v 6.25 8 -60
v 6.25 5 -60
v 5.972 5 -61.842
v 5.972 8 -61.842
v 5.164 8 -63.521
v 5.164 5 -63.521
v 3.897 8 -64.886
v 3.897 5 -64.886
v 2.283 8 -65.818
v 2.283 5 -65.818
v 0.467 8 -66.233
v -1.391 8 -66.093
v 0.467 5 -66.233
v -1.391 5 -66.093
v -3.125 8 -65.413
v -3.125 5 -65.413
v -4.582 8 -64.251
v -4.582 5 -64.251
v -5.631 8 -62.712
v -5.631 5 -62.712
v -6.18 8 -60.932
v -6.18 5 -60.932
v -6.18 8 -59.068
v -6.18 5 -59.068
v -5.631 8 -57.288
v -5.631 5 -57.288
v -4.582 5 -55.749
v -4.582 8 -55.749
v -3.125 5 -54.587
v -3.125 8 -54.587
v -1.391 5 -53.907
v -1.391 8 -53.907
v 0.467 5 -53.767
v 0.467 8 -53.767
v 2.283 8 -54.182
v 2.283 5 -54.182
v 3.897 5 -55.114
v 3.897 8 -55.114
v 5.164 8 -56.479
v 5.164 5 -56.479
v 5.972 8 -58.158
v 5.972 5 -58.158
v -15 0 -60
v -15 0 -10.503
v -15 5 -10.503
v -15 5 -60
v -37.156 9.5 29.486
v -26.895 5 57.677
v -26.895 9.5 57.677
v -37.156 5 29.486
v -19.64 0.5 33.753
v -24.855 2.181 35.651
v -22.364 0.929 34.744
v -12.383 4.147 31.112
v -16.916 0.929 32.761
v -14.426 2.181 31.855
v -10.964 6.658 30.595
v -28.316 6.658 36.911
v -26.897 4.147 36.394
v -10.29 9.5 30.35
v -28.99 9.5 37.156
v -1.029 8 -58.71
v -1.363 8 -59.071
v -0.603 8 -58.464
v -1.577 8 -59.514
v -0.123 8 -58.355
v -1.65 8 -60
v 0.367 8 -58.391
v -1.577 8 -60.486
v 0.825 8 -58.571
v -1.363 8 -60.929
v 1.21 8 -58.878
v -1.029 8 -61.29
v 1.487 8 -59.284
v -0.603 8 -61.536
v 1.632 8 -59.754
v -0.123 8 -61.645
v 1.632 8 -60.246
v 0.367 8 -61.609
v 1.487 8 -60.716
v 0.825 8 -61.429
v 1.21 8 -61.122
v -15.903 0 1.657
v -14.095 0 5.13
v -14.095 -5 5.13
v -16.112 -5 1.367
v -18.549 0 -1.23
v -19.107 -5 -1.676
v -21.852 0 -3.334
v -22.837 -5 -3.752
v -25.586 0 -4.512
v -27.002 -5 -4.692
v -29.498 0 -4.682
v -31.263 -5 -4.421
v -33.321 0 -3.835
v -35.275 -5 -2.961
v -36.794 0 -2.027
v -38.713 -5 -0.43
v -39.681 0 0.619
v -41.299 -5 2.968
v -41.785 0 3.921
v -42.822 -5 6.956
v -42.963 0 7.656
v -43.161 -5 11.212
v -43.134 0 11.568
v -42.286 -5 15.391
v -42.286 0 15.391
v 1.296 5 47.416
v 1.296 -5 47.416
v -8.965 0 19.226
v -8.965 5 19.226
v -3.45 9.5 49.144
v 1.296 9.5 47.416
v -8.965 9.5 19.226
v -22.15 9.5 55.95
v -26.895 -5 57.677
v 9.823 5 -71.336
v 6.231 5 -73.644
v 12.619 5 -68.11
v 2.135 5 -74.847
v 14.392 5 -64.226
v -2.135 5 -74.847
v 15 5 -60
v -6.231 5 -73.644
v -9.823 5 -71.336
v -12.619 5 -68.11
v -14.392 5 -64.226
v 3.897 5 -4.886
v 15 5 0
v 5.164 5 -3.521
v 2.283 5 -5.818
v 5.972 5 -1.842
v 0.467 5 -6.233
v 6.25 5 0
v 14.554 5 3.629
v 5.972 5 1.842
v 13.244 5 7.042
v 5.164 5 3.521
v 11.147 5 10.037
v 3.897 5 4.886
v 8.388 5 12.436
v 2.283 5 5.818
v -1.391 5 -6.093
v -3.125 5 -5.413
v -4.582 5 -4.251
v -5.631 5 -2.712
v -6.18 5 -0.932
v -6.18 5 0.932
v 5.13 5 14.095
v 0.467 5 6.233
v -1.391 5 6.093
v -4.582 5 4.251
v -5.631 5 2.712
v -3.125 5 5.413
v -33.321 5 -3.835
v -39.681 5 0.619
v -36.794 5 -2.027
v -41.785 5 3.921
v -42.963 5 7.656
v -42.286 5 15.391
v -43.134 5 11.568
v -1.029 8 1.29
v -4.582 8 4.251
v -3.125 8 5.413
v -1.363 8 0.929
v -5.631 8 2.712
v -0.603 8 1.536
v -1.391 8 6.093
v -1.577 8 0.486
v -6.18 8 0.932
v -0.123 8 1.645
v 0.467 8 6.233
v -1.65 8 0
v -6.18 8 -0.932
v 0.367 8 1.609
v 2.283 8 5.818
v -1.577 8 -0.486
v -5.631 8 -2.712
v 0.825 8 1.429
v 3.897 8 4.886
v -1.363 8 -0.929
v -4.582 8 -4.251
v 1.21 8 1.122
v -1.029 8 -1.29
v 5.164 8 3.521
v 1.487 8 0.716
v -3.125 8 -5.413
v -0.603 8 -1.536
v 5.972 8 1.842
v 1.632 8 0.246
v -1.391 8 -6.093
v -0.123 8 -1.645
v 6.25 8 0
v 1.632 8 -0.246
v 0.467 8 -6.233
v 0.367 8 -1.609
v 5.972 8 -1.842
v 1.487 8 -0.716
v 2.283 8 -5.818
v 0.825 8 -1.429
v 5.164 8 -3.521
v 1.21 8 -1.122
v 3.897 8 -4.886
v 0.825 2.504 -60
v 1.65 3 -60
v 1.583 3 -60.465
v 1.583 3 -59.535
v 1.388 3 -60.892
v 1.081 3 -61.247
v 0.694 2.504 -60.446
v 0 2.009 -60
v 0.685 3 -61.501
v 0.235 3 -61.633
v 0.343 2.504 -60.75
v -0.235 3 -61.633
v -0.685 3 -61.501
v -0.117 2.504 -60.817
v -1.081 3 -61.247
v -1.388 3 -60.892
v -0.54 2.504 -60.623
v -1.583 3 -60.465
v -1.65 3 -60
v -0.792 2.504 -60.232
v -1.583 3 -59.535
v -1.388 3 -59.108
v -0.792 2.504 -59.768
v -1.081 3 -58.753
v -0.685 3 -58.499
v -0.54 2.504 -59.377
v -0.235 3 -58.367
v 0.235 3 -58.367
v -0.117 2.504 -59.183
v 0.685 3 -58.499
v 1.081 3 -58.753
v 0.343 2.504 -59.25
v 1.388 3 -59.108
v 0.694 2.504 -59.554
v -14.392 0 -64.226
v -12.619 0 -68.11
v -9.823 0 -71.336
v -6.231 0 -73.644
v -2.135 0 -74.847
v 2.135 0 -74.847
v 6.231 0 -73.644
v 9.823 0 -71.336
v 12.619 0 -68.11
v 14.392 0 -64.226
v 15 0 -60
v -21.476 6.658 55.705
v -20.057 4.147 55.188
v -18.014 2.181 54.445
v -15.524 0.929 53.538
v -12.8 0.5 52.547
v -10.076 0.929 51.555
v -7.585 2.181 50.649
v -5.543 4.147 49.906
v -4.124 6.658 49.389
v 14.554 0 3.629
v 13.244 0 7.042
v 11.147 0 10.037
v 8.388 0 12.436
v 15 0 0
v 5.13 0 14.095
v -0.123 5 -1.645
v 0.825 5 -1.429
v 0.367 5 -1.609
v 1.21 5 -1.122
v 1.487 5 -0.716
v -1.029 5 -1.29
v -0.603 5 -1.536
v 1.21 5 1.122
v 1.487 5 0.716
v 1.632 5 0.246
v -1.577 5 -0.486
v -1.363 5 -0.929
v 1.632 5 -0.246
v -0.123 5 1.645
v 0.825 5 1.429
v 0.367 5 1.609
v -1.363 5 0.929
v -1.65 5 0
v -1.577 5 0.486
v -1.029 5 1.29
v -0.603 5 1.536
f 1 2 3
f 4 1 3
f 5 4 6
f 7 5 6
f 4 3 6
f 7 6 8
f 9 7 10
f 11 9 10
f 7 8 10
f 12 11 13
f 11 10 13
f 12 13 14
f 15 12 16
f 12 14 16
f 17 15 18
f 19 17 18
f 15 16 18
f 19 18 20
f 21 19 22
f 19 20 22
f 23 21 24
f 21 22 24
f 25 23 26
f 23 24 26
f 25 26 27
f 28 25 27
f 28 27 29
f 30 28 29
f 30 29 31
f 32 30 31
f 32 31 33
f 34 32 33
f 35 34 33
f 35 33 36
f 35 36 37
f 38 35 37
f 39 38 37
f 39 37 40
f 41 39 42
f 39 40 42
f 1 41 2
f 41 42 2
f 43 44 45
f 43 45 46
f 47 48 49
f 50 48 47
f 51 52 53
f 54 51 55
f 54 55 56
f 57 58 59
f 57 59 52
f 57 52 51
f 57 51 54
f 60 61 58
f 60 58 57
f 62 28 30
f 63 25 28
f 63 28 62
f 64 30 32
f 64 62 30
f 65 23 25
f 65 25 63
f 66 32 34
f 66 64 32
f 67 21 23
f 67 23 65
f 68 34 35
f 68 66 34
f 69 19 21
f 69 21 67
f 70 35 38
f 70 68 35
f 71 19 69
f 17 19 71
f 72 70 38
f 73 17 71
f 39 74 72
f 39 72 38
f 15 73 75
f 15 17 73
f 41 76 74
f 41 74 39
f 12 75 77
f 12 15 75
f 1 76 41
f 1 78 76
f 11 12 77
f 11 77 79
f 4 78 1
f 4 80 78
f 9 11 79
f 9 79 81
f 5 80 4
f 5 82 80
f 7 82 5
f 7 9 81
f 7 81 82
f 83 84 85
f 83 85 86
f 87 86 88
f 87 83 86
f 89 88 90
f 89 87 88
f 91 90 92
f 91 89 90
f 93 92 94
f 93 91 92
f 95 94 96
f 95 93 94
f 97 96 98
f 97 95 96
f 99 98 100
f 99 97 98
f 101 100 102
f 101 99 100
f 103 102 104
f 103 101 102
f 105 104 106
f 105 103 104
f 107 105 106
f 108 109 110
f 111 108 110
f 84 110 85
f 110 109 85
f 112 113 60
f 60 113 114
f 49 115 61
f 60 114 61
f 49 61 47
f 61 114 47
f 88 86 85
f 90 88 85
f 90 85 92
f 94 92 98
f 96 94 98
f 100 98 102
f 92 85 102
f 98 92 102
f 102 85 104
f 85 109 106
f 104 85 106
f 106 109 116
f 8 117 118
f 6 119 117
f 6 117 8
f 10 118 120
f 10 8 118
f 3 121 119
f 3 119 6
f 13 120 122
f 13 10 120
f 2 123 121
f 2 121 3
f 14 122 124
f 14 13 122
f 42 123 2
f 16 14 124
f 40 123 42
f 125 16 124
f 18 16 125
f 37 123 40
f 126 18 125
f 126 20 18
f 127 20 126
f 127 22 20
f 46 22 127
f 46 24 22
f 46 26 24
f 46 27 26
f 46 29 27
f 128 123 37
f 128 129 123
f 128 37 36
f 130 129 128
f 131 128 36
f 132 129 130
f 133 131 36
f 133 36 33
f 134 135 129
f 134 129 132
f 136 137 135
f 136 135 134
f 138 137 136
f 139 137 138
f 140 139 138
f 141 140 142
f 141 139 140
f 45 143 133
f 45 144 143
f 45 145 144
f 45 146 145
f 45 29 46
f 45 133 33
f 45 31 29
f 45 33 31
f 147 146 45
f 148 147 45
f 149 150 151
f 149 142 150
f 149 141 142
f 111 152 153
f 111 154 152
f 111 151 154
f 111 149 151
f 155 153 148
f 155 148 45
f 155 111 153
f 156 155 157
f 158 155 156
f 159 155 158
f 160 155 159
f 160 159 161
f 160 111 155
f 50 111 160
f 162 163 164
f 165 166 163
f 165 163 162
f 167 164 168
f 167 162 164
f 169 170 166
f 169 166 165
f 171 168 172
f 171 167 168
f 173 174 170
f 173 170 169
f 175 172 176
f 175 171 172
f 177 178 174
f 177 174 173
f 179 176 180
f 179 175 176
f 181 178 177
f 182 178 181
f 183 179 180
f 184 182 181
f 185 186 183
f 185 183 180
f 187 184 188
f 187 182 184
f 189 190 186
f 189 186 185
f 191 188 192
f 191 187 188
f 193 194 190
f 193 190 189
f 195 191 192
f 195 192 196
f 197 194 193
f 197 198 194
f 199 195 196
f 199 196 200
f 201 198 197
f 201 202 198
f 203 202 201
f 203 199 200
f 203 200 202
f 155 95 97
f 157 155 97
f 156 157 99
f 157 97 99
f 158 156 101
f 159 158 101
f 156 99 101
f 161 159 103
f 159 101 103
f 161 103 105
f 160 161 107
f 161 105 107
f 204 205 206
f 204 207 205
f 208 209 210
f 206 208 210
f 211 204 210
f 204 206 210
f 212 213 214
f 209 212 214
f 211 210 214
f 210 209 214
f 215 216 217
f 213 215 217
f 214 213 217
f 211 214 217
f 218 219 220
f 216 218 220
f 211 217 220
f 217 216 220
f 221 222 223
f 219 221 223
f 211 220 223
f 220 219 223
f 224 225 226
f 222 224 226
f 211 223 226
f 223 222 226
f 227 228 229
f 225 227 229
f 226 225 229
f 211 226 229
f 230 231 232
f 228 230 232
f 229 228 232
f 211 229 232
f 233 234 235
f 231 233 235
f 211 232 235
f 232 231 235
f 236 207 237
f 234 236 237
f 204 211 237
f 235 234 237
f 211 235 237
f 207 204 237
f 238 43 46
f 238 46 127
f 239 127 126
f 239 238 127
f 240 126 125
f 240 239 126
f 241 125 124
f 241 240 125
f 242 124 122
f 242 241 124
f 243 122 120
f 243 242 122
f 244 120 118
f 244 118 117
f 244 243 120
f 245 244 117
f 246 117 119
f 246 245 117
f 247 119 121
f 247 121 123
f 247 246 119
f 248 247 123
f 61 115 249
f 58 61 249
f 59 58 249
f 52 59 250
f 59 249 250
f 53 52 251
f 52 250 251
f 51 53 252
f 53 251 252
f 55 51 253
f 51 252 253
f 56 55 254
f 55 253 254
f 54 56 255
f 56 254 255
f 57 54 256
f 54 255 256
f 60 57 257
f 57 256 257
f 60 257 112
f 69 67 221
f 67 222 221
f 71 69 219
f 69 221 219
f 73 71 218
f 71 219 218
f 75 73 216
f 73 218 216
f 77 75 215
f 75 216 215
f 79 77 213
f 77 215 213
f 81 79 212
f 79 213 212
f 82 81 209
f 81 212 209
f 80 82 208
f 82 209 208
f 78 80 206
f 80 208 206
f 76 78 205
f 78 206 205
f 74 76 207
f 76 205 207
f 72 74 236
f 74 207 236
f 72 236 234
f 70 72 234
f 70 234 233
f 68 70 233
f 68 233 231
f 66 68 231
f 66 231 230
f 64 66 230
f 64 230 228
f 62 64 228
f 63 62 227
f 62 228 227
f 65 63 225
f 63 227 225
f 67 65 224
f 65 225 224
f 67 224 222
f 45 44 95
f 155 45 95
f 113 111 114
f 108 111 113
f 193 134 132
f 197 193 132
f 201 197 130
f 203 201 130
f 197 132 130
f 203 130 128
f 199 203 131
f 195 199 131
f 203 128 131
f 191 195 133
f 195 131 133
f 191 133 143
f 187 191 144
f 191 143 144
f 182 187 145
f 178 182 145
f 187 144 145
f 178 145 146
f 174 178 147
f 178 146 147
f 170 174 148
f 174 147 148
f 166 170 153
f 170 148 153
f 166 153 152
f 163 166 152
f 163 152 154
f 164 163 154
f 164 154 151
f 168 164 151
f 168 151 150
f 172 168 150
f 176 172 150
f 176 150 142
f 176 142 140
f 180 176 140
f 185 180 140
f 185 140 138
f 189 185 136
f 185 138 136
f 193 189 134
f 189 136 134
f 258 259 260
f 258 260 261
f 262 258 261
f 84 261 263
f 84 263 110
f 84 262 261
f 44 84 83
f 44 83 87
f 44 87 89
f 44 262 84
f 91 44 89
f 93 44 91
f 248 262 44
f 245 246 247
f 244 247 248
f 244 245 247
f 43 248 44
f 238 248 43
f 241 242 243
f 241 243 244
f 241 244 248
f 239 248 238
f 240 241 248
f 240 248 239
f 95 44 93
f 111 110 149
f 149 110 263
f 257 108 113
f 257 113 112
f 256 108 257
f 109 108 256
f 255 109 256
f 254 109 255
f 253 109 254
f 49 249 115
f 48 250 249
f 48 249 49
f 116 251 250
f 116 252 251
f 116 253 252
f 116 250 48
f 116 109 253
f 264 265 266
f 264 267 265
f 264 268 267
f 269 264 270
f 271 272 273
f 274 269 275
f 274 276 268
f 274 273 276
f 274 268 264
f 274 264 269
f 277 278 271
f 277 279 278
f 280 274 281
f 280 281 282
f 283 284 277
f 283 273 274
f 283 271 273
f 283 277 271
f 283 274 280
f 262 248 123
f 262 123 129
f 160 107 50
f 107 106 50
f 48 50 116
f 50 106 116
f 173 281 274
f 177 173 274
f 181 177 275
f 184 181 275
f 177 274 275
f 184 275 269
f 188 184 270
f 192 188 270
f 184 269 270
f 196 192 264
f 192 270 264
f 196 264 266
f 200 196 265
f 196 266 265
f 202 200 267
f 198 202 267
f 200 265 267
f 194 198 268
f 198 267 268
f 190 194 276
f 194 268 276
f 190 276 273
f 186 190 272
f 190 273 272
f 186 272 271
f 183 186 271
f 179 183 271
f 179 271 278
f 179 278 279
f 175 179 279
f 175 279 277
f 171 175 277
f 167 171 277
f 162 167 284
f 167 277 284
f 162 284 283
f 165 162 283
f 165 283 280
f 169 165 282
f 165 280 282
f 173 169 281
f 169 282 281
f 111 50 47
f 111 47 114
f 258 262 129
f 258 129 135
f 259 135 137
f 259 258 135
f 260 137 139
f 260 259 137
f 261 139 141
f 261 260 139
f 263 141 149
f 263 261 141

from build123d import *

# Parameters (mm, degrees)
EXTRUDE_1_DEPTH        = 5
SKETCH_2_R             = 6.25
EXTRUDE_2_DEPTH        = 3
HOLE_WIZARD_M4_1_D     = 3.3
HOLE_WIZARD_M4_1_DEPTH = 5
HOLE_WIZARD_M4_1_TIP   = 0.991420021
EXTRUDE_3_DEPTH        = 5
EXTRUDE_4_DEPTH        = 5
EXTRUDE_4_DEPTH_BACK   = 5
EXTRUDE_5_DEPTH        = 4.5
SKETCH_12_R            = 10
CUT_EXTRUDE_1_DEPTH    = 20


with BuildPart() as part:
    # 스케치1 → 보스-돌출1 (new body)
    with BuildSketch(Plane(origin=(0, 0, 0), x_dir=(1, 0, 0), z_dir=(0, 1, 0))):
        with BuildLine():
            Line((-15, 0), (-15, 60))
            ThreePointArc((-15, 60), (0, 75), (15, 60))
            Line((15, 60), (15, 0))
            ThreePointArc((15, 0), (0, -15), (-15, 0))
        make_face()
    extrude(amount=EXTRUDE_1_DEPTH)

    # 스케치2 → 보스-돌출2 (add)
    with BuildSketch(Plane(origin=(0, 5, 0), x_dir=(1, 0, 0), z_dir=(0, 1, 0))):
        with Locations((0, 60)):
            Circle(SKETCH_2_R)
        Circle(SKETCH_2_R)
    extrude(amount=EXTRUDE_2_DEPTH)

    # M4 탭을 위한 탭 드릴1
    with Locations(Plane(origin=(0, 8, 0), x_dir=(1, 0, 0), z_dir=(0, 1, 0))):
        with Locations((0, 0), (0, 60)):
            Hole(HOLE_WIZARD_M4_1_D / 2, depth=HOLE_WIZARD_M4_1_DEPTH)
            with Locations((0, 0, -(HOLE_WIZARD_M4_1_DEPTH + HOLE_WIZARD_M4_1_TIP / 2))):  # 118° drill point
                Cone(0, HOLE_WIZARD_M4_1_D / 2, HOLE_WIZARD_M4_1_TIP, mode=Mode.SUBTRACT)

    # 스케치9 → 보스-돌출3 (add)
    with BuildSketch(Plane.XZ):
        with BuildLine():
            Line((-5.13030215, -14.095389312), (-33.321080773, -3.834785012))
            ThreePointArc((-33.321080773, -3.834785012), (-42.286167935, 15.39090645), (-23.060476474, 24.355993612))
            Line((-23.060476474, 24.355993612), (5.13030215, 14.095389312))
            ThreePointArc((5.13030215, 14.095389312), (14.095389312, -5.13030215), (-5.13030215, -14.095389312))
        make_face()
    extrude(amount=-EXTRUDE_3_DEPTH)

    # 스케치10 → 보스-돌출4 (add, two sides: drawn at the far end of the back side and taken through both)
    with BuildSketch(Plane.XZ.offset(-EXTRUDE_4_DEPTH_BACK)):
        with BuildLine():
            Line((-42.286167935, 15.39090645), (-26.895261486, 57.677074385))
            Line((-26.895261486, 57.677074385), (1.295517138, 47.416470085))
            Line((1.295517138, 47.416470085), (-14.095389312, 5.13030215))
            ThreePointArc((-14.095389312, 5.13030215), (-33.321080773, -3.834785012), (-42.286167935, 15.39090645))
        make_face()
    extrude(amount=EXTRUDE_4_DEPTH + EXTRUDE_4_DEPTH_BACK)

    # 스케치11 → 보스-돌출5 (add)
    with BuildSketch(Plane(origin=(0, 5, 0), x_dir=(1, 0, 0), z_dir=(0, 1, 0))):
        Polygon((-26.895261486, -57.677074385), (-37.155865785, -29.486295761), (-8.965087162, -19.225691462), (1.295517138, -47.416470085), align=None)
    extrude(amount=EXTRUDE_5_DEPTH)

    # 스케치12 → 컷-돌출1 (cut)
    with BuildSketch(Plane(origin=(15.39090645, 0, 42.286167935), x_dir=(0.9396926207859109, 0, -0.342020143325662), z_dir=(0.342020143325662, 0, 0.9396926207859109))):
        with Locations((-30, 10.5)):
            Circle(SKETCH_12_R)
    extrude(amount=-CUT_EXTRUDE_1_DEPTH, mode=Mode.SUBTRACT)


solid = part.part
